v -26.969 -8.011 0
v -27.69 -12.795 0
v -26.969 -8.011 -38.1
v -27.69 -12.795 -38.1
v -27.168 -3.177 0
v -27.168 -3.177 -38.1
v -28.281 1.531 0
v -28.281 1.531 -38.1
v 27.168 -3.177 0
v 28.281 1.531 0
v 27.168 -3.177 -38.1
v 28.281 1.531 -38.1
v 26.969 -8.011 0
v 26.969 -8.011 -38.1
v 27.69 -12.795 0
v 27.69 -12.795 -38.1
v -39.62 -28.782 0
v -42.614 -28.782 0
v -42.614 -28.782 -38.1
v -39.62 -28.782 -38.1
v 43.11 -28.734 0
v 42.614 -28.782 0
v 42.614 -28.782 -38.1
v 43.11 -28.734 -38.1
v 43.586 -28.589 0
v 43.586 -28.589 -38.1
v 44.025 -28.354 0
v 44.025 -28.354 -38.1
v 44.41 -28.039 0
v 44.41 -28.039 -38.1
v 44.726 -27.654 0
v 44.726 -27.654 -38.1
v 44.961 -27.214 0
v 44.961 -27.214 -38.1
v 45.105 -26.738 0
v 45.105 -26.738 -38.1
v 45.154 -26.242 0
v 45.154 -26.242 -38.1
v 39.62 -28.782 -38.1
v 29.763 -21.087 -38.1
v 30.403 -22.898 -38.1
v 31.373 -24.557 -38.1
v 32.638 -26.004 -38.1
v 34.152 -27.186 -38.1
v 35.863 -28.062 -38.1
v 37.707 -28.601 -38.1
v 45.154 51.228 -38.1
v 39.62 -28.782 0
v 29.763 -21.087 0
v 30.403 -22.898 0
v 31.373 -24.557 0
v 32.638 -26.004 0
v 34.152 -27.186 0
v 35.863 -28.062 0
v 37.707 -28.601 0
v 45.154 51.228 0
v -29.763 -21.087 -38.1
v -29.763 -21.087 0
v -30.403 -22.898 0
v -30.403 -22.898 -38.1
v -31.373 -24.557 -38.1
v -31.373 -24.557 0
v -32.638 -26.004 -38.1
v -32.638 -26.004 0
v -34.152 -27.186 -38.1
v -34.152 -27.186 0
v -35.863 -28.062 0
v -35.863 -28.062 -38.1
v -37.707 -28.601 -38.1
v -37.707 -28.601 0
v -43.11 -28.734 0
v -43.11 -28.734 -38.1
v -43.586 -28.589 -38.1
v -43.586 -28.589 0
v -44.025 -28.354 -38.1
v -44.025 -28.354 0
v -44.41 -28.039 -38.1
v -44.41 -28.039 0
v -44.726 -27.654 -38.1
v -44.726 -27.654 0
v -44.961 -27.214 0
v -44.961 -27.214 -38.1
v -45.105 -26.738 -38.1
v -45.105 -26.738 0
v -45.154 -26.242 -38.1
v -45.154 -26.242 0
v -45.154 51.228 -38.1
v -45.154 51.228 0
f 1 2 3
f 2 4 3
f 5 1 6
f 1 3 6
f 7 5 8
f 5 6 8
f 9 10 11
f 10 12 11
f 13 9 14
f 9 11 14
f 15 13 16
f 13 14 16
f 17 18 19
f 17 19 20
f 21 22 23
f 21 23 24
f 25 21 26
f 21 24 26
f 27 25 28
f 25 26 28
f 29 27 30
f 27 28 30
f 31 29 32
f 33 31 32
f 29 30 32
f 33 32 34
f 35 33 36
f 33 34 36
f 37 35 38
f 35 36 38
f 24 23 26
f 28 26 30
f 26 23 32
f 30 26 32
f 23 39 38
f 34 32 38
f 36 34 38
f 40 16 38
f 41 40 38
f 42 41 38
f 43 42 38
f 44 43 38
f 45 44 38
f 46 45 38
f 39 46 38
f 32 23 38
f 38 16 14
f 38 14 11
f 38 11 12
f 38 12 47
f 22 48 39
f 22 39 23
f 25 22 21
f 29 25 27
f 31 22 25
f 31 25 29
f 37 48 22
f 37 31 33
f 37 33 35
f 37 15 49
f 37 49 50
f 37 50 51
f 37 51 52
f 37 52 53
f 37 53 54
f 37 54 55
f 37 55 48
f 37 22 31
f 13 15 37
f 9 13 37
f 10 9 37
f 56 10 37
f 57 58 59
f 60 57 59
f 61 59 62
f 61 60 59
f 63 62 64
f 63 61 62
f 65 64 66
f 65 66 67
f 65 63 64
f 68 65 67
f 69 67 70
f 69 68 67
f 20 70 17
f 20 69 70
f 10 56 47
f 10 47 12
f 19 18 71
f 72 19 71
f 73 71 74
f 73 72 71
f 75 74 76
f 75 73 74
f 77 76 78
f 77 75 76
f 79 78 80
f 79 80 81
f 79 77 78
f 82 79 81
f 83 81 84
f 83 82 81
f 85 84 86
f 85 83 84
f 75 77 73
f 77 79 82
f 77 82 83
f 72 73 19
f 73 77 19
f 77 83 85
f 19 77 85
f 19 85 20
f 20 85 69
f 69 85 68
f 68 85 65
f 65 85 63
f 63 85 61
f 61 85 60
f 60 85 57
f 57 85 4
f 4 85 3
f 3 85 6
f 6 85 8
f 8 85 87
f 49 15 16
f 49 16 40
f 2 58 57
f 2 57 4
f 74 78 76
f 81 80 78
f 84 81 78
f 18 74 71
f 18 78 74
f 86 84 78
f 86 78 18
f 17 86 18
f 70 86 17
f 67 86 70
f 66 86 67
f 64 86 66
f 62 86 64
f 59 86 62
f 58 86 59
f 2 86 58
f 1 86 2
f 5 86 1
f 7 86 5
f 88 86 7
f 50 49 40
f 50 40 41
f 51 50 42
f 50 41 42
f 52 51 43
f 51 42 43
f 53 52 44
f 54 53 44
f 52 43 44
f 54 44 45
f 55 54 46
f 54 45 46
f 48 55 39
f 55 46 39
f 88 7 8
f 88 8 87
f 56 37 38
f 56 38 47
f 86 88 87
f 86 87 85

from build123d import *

# Parameters (mm, degrees)
F1_DEPTH = 38.1
F2_R     = 25.4
F3_R     = 10.16
F4_R     = 2.54
F5_R     = 25.4
F6_R     = 10.16
F7_R     = 2.54


with BuildPart() as f1:
    # F0 (on Top) → F1 (new body)
    with BuildSketch(Plane.XY):
        Polygon((-45.154162, 51.227525), (-45.154162, -28.782476), (-31.687129, -28.782476), (-25.877822, -5.545248), align=None)
        Polygon((45.154162, -28.782476), (45.154162, 51.227525), (25.877822, -5.545248), (31.687129, -28.782476), align=None)
    extrude(amount=-F1_DEPTH)

    # F2
    f2_edges = [f1.edges().sort_by_distance(p)[0] for p in [
        (25.877822, -5.545248, -19.05),
    ]]
    fillet(f2_edges, radius=F2_R)

    # F3
    f3_edges = [f1.edges().sort_by_distance(p)[0] for p in [
        (31.687129, -28.782476, -19.05),
    ]]
    fillet(f3_edges, radius=F3_R)

    # F4
    f4_edges = [f1.edges().sort_by_distance(p)[0] for p in [
        (45.154162, -28.782476, -19.05),
    ]]
    fillet(f4_edges, radius=F4_R)

    # F5
    f5_edges = [f1.edges().sort_by_distance(p)[0] for p in [
        (-25.877822, -5.545248, -19.05),
    ]]
    fillet(f5_edges, radius=F5_R)

    # F6
    f6_edges = [f1.edges().sort_by_distance(p)[0] for p in [
        (-31.687129, -28.782476, -19.05),
    ]]
    fillet(f6_edges, radius=F6_R)

    # F7
    f7_edges = [f1.edges().sort_by_distance(p)[0] for p in [
        (-45.154162, -28.782476, -19.05),
    ]]
    fillet(f7_edges, radius=F7_R)


solid = f1.part
